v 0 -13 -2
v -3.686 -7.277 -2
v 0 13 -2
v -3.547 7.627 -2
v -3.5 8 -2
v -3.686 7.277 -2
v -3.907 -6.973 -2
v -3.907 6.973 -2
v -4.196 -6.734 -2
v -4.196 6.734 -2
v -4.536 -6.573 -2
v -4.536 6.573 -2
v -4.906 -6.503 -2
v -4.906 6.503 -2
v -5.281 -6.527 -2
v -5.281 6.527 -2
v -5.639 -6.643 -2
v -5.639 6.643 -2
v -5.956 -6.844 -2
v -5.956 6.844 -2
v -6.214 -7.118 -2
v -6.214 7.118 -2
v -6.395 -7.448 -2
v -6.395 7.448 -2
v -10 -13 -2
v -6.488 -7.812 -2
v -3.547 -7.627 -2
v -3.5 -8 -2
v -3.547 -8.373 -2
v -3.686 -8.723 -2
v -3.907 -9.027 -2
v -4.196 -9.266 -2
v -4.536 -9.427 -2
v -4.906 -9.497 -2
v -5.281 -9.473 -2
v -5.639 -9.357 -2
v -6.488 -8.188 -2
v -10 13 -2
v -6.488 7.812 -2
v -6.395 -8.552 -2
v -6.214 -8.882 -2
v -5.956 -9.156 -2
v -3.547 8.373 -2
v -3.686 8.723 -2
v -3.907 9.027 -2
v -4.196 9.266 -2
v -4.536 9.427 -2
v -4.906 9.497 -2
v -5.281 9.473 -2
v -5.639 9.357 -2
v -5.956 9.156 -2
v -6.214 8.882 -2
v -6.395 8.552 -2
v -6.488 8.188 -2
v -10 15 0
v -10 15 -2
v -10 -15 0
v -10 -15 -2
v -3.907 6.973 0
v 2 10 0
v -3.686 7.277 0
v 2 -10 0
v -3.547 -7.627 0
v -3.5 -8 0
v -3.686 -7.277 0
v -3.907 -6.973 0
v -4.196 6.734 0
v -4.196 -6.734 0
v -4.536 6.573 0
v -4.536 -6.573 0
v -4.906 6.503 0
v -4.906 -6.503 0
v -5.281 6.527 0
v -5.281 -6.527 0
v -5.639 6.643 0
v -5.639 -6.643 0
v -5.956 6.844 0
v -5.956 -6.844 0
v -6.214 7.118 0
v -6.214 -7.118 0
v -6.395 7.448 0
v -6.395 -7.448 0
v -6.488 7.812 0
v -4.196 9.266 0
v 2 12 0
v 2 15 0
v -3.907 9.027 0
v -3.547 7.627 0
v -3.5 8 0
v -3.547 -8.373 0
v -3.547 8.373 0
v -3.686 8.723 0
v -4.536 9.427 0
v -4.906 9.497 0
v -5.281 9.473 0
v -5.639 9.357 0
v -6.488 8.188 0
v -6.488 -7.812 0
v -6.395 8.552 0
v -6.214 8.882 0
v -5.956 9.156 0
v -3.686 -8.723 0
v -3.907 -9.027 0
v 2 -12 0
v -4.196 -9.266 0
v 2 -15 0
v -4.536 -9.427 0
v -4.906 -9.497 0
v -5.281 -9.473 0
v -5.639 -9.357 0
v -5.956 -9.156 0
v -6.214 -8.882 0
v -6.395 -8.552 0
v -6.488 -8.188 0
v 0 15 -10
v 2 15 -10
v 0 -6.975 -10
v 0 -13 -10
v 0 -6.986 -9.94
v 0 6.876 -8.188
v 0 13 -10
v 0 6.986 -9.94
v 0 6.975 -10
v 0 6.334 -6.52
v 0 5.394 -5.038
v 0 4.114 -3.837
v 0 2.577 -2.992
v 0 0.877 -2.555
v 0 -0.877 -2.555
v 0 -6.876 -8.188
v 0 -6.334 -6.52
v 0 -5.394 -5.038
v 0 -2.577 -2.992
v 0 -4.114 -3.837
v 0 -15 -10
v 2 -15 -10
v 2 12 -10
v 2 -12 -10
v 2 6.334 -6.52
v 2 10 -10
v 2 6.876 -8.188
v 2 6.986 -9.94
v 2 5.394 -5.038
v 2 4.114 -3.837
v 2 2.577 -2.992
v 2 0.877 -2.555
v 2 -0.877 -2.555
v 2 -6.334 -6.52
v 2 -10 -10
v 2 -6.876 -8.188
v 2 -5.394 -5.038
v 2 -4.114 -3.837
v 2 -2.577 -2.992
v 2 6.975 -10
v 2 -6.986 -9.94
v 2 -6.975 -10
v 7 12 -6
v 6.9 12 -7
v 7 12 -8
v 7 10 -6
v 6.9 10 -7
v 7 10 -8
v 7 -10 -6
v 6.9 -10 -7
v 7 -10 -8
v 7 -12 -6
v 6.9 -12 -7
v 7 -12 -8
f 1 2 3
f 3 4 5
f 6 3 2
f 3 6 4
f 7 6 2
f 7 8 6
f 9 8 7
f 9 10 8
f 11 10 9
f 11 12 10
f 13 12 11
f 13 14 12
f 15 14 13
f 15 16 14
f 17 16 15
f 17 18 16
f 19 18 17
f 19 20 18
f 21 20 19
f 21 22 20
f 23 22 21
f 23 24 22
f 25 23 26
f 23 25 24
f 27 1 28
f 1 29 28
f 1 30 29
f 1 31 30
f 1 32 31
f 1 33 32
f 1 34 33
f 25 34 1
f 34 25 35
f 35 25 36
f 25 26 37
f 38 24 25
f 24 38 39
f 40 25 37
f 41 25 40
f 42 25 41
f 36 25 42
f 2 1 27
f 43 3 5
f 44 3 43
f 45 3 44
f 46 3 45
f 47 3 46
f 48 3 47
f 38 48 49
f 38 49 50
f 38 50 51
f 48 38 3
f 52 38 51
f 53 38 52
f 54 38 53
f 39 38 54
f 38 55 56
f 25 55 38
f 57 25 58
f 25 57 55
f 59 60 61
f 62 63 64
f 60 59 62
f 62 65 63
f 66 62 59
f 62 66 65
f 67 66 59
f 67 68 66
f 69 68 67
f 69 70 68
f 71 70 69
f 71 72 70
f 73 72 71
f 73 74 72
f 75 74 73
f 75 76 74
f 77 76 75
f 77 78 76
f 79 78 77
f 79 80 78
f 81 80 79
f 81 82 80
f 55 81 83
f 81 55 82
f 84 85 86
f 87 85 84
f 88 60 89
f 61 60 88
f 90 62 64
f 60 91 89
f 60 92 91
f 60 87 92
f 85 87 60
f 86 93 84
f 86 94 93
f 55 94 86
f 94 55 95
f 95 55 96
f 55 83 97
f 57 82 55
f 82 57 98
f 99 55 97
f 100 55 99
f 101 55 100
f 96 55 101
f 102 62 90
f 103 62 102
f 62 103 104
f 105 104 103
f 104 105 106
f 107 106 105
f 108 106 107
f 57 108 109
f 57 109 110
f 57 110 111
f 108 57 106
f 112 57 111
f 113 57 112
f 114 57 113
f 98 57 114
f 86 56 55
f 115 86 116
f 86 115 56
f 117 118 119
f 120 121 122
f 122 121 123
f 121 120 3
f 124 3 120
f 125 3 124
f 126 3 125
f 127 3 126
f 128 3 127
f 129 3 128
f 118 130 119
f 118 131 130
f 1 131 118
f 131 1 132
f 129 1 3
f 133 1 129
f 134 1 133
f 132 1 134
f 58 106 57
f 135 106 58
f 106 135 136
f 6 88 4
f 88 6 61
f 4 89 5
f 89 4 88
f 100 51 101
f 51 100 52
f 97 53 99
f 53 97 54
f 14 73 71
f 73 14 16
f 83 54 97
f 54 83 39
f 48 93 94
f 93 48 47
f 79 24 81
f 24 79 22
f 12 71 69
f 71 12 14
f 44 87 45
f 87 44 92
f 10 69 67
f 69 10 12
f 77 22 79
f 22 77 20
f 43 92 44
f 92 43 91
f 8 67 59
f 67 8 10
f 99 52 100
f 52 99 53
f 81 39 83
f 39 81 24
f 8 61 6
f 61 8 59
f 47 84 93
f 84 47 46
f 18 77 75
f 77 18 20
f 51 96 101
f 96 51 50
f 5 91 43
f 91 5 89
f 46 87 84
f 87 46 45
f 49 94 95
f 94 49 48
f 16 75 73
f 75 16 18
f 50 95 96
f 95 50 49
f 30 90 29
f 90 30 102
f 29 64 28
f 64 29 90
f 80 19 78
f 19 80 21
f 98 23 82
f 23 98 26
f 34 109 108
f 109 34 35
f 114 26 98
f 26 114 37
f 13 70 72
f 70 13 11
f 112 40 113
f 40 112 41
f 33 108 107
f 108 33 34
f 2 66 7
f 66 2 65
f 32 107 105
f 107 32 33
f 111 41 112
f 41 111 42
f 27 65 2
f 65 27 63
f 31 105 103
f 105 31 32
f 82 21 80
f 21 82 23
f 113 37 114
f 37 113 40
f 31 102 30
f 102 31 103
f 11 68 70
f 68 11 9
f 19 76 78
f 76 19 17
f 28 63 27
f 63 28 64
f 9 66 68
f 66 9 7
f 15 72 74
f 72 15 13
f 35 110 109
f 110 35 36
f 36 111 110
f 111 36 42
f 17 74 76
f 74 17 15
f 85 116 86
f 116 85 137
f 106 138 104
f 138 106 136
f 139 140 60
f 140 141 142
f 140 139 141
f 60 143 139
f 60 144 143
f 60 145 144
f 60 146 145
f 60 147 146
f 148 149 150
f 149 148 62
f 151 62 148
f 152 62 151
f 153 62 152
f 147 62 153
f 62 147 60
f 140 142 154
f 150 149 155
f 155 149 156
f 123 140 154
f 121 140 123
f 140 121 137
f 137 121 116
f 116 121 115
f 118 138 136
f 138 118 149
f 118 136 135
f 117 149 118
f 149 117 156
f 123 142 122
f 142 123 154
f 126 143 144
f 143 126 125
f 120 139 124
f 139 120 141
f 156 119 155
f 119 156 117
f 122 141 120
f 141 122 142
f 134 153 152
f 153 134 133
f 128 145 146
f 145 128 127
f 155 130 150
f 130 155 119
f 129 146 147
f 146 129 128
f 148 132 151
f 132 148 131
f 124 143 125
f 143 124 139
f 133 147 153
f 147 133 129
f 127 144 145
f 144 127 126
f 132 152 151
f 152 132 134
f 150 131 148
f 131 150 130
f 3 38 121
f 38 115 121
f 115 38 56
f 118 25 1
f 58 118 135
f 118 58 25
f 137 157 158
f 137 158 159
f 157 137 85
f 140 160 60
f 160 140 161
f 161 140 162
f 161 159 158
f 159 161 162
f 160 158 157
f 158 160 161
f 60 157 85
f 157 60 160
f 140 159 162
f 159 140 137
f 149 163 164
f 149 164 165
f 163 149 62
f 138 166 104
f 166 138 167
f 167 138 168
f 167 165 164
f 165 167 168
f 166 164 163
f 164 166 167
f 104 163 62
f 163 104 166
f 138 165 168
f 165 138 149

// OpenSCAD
/* [Furniture Information] */
gap_between_doors = 20; //[5:100]

mounting_depth = 10; //[10:50]

gap_between_door_and_furniture = 5; //[1:10]

doorside_Z_axis_height = 10;
/* [Thing Details] */
resolution = 25; //[50:100]

screw_diameter = 3;

extrusion_thickness = 2;

/* [Hidden] */
posY = gap_between_doors/2*0.8;

union() {
    translate([-mounting_depth/2,0,-extrusion_thickness])
        difference() {
            linear_extrude(extrusion_thickness,true)
                square([mounting_depth,gap_between_doors*1.5],true); 
                translate([0,posY,-20])
                    linear_extrude(50, true)
                        circle(d=screw_diameter, $fn=resolution);
                translate([0,-posY,-20])
                    linear_extrude(50, true)
                        circle(d=screw_diameter, $fn=resolution);
                        
        }
    
    translate([0,0,-doorside_Z_axis_height/2])
        rotate([0,90,0])
            union() {
                difference() {
                    linear_extrude(extrusion_thickness,true)
                        square([doorside_Z_axis_height,gap_between_doors*1.5],true);
                    
                    translate([gap_between_doors*0.7/2-doorside_Z_axis_height*0.25,0,-20])
                        linear_extrude(50,true)
                            circle(d=gap_between_doors*0.7, true, $fn=resolution);
                }   
               translate([0,gap_between_doors/2*1.5-extrusion_thickness,0]) 
                    rotate([-90,0,0])    
                        linear_extrude(extrusion_thickness,true)
                            polygon(points=[[-doorside_Z_axis_height/2 + extrusion_thickness,0],[doorside_Z_axis_height/2,0],[-doorside_Z_axis_height/2 + extrusion_thickness,mounting_depth]]);
                
                translate([0,-gap_between_doors/2*1.5,0]) 
                    rotate([-90,0,0])    
                        linear_extrude(extrusion_thickness,true)
                            polygon(points=[[-doorside_Z_axis_height/2 + extrusion_thickness,0],[doorside_Z_axis_height/2,0],[-doorside_Z_axis_height/2 + extrusion_thickness,mounting_depth]]);
                
                translate([0,gap_between_doors/2+extrusion_thickness,extrusion_thickness])
                    rotate([90,0,0])
                        linear_extrude(extrusion_thickness,true)
                            polygon(points=[[-doorside_Z_axis_height/2,0],[doorside_Z_axis_height/2,0],[doorside_Z_axis_height/2*0.6,gap_between_door_and_furniture],[doorside_Z_axis_height/2*0.4,gap_between_door_and_furniture*0.98],[doorside_Z_axis_height/2*0.2,gap_between_door_and_furniture]]);
                
                
                translate([0,-gap_between_doors/2,extrusion_thickness])
                    rotate([90,0,0])
                        linear_extrude(extrusion_thickness,true)
                            polygon(points=[[-doorside_Z_axis_height/2,0],[doorside_Z_axis_height/2,0],[doorside_Z_axis_height/2*0.6,gap_between_door_and_furniture],[doorside_Z_axis_height/2*0.4,gap_between_door_and_furniture*0.98],[doorside_Z_axis_height/2*0.2,gap_between_door_and_furniture]]);
        
            }
 }
